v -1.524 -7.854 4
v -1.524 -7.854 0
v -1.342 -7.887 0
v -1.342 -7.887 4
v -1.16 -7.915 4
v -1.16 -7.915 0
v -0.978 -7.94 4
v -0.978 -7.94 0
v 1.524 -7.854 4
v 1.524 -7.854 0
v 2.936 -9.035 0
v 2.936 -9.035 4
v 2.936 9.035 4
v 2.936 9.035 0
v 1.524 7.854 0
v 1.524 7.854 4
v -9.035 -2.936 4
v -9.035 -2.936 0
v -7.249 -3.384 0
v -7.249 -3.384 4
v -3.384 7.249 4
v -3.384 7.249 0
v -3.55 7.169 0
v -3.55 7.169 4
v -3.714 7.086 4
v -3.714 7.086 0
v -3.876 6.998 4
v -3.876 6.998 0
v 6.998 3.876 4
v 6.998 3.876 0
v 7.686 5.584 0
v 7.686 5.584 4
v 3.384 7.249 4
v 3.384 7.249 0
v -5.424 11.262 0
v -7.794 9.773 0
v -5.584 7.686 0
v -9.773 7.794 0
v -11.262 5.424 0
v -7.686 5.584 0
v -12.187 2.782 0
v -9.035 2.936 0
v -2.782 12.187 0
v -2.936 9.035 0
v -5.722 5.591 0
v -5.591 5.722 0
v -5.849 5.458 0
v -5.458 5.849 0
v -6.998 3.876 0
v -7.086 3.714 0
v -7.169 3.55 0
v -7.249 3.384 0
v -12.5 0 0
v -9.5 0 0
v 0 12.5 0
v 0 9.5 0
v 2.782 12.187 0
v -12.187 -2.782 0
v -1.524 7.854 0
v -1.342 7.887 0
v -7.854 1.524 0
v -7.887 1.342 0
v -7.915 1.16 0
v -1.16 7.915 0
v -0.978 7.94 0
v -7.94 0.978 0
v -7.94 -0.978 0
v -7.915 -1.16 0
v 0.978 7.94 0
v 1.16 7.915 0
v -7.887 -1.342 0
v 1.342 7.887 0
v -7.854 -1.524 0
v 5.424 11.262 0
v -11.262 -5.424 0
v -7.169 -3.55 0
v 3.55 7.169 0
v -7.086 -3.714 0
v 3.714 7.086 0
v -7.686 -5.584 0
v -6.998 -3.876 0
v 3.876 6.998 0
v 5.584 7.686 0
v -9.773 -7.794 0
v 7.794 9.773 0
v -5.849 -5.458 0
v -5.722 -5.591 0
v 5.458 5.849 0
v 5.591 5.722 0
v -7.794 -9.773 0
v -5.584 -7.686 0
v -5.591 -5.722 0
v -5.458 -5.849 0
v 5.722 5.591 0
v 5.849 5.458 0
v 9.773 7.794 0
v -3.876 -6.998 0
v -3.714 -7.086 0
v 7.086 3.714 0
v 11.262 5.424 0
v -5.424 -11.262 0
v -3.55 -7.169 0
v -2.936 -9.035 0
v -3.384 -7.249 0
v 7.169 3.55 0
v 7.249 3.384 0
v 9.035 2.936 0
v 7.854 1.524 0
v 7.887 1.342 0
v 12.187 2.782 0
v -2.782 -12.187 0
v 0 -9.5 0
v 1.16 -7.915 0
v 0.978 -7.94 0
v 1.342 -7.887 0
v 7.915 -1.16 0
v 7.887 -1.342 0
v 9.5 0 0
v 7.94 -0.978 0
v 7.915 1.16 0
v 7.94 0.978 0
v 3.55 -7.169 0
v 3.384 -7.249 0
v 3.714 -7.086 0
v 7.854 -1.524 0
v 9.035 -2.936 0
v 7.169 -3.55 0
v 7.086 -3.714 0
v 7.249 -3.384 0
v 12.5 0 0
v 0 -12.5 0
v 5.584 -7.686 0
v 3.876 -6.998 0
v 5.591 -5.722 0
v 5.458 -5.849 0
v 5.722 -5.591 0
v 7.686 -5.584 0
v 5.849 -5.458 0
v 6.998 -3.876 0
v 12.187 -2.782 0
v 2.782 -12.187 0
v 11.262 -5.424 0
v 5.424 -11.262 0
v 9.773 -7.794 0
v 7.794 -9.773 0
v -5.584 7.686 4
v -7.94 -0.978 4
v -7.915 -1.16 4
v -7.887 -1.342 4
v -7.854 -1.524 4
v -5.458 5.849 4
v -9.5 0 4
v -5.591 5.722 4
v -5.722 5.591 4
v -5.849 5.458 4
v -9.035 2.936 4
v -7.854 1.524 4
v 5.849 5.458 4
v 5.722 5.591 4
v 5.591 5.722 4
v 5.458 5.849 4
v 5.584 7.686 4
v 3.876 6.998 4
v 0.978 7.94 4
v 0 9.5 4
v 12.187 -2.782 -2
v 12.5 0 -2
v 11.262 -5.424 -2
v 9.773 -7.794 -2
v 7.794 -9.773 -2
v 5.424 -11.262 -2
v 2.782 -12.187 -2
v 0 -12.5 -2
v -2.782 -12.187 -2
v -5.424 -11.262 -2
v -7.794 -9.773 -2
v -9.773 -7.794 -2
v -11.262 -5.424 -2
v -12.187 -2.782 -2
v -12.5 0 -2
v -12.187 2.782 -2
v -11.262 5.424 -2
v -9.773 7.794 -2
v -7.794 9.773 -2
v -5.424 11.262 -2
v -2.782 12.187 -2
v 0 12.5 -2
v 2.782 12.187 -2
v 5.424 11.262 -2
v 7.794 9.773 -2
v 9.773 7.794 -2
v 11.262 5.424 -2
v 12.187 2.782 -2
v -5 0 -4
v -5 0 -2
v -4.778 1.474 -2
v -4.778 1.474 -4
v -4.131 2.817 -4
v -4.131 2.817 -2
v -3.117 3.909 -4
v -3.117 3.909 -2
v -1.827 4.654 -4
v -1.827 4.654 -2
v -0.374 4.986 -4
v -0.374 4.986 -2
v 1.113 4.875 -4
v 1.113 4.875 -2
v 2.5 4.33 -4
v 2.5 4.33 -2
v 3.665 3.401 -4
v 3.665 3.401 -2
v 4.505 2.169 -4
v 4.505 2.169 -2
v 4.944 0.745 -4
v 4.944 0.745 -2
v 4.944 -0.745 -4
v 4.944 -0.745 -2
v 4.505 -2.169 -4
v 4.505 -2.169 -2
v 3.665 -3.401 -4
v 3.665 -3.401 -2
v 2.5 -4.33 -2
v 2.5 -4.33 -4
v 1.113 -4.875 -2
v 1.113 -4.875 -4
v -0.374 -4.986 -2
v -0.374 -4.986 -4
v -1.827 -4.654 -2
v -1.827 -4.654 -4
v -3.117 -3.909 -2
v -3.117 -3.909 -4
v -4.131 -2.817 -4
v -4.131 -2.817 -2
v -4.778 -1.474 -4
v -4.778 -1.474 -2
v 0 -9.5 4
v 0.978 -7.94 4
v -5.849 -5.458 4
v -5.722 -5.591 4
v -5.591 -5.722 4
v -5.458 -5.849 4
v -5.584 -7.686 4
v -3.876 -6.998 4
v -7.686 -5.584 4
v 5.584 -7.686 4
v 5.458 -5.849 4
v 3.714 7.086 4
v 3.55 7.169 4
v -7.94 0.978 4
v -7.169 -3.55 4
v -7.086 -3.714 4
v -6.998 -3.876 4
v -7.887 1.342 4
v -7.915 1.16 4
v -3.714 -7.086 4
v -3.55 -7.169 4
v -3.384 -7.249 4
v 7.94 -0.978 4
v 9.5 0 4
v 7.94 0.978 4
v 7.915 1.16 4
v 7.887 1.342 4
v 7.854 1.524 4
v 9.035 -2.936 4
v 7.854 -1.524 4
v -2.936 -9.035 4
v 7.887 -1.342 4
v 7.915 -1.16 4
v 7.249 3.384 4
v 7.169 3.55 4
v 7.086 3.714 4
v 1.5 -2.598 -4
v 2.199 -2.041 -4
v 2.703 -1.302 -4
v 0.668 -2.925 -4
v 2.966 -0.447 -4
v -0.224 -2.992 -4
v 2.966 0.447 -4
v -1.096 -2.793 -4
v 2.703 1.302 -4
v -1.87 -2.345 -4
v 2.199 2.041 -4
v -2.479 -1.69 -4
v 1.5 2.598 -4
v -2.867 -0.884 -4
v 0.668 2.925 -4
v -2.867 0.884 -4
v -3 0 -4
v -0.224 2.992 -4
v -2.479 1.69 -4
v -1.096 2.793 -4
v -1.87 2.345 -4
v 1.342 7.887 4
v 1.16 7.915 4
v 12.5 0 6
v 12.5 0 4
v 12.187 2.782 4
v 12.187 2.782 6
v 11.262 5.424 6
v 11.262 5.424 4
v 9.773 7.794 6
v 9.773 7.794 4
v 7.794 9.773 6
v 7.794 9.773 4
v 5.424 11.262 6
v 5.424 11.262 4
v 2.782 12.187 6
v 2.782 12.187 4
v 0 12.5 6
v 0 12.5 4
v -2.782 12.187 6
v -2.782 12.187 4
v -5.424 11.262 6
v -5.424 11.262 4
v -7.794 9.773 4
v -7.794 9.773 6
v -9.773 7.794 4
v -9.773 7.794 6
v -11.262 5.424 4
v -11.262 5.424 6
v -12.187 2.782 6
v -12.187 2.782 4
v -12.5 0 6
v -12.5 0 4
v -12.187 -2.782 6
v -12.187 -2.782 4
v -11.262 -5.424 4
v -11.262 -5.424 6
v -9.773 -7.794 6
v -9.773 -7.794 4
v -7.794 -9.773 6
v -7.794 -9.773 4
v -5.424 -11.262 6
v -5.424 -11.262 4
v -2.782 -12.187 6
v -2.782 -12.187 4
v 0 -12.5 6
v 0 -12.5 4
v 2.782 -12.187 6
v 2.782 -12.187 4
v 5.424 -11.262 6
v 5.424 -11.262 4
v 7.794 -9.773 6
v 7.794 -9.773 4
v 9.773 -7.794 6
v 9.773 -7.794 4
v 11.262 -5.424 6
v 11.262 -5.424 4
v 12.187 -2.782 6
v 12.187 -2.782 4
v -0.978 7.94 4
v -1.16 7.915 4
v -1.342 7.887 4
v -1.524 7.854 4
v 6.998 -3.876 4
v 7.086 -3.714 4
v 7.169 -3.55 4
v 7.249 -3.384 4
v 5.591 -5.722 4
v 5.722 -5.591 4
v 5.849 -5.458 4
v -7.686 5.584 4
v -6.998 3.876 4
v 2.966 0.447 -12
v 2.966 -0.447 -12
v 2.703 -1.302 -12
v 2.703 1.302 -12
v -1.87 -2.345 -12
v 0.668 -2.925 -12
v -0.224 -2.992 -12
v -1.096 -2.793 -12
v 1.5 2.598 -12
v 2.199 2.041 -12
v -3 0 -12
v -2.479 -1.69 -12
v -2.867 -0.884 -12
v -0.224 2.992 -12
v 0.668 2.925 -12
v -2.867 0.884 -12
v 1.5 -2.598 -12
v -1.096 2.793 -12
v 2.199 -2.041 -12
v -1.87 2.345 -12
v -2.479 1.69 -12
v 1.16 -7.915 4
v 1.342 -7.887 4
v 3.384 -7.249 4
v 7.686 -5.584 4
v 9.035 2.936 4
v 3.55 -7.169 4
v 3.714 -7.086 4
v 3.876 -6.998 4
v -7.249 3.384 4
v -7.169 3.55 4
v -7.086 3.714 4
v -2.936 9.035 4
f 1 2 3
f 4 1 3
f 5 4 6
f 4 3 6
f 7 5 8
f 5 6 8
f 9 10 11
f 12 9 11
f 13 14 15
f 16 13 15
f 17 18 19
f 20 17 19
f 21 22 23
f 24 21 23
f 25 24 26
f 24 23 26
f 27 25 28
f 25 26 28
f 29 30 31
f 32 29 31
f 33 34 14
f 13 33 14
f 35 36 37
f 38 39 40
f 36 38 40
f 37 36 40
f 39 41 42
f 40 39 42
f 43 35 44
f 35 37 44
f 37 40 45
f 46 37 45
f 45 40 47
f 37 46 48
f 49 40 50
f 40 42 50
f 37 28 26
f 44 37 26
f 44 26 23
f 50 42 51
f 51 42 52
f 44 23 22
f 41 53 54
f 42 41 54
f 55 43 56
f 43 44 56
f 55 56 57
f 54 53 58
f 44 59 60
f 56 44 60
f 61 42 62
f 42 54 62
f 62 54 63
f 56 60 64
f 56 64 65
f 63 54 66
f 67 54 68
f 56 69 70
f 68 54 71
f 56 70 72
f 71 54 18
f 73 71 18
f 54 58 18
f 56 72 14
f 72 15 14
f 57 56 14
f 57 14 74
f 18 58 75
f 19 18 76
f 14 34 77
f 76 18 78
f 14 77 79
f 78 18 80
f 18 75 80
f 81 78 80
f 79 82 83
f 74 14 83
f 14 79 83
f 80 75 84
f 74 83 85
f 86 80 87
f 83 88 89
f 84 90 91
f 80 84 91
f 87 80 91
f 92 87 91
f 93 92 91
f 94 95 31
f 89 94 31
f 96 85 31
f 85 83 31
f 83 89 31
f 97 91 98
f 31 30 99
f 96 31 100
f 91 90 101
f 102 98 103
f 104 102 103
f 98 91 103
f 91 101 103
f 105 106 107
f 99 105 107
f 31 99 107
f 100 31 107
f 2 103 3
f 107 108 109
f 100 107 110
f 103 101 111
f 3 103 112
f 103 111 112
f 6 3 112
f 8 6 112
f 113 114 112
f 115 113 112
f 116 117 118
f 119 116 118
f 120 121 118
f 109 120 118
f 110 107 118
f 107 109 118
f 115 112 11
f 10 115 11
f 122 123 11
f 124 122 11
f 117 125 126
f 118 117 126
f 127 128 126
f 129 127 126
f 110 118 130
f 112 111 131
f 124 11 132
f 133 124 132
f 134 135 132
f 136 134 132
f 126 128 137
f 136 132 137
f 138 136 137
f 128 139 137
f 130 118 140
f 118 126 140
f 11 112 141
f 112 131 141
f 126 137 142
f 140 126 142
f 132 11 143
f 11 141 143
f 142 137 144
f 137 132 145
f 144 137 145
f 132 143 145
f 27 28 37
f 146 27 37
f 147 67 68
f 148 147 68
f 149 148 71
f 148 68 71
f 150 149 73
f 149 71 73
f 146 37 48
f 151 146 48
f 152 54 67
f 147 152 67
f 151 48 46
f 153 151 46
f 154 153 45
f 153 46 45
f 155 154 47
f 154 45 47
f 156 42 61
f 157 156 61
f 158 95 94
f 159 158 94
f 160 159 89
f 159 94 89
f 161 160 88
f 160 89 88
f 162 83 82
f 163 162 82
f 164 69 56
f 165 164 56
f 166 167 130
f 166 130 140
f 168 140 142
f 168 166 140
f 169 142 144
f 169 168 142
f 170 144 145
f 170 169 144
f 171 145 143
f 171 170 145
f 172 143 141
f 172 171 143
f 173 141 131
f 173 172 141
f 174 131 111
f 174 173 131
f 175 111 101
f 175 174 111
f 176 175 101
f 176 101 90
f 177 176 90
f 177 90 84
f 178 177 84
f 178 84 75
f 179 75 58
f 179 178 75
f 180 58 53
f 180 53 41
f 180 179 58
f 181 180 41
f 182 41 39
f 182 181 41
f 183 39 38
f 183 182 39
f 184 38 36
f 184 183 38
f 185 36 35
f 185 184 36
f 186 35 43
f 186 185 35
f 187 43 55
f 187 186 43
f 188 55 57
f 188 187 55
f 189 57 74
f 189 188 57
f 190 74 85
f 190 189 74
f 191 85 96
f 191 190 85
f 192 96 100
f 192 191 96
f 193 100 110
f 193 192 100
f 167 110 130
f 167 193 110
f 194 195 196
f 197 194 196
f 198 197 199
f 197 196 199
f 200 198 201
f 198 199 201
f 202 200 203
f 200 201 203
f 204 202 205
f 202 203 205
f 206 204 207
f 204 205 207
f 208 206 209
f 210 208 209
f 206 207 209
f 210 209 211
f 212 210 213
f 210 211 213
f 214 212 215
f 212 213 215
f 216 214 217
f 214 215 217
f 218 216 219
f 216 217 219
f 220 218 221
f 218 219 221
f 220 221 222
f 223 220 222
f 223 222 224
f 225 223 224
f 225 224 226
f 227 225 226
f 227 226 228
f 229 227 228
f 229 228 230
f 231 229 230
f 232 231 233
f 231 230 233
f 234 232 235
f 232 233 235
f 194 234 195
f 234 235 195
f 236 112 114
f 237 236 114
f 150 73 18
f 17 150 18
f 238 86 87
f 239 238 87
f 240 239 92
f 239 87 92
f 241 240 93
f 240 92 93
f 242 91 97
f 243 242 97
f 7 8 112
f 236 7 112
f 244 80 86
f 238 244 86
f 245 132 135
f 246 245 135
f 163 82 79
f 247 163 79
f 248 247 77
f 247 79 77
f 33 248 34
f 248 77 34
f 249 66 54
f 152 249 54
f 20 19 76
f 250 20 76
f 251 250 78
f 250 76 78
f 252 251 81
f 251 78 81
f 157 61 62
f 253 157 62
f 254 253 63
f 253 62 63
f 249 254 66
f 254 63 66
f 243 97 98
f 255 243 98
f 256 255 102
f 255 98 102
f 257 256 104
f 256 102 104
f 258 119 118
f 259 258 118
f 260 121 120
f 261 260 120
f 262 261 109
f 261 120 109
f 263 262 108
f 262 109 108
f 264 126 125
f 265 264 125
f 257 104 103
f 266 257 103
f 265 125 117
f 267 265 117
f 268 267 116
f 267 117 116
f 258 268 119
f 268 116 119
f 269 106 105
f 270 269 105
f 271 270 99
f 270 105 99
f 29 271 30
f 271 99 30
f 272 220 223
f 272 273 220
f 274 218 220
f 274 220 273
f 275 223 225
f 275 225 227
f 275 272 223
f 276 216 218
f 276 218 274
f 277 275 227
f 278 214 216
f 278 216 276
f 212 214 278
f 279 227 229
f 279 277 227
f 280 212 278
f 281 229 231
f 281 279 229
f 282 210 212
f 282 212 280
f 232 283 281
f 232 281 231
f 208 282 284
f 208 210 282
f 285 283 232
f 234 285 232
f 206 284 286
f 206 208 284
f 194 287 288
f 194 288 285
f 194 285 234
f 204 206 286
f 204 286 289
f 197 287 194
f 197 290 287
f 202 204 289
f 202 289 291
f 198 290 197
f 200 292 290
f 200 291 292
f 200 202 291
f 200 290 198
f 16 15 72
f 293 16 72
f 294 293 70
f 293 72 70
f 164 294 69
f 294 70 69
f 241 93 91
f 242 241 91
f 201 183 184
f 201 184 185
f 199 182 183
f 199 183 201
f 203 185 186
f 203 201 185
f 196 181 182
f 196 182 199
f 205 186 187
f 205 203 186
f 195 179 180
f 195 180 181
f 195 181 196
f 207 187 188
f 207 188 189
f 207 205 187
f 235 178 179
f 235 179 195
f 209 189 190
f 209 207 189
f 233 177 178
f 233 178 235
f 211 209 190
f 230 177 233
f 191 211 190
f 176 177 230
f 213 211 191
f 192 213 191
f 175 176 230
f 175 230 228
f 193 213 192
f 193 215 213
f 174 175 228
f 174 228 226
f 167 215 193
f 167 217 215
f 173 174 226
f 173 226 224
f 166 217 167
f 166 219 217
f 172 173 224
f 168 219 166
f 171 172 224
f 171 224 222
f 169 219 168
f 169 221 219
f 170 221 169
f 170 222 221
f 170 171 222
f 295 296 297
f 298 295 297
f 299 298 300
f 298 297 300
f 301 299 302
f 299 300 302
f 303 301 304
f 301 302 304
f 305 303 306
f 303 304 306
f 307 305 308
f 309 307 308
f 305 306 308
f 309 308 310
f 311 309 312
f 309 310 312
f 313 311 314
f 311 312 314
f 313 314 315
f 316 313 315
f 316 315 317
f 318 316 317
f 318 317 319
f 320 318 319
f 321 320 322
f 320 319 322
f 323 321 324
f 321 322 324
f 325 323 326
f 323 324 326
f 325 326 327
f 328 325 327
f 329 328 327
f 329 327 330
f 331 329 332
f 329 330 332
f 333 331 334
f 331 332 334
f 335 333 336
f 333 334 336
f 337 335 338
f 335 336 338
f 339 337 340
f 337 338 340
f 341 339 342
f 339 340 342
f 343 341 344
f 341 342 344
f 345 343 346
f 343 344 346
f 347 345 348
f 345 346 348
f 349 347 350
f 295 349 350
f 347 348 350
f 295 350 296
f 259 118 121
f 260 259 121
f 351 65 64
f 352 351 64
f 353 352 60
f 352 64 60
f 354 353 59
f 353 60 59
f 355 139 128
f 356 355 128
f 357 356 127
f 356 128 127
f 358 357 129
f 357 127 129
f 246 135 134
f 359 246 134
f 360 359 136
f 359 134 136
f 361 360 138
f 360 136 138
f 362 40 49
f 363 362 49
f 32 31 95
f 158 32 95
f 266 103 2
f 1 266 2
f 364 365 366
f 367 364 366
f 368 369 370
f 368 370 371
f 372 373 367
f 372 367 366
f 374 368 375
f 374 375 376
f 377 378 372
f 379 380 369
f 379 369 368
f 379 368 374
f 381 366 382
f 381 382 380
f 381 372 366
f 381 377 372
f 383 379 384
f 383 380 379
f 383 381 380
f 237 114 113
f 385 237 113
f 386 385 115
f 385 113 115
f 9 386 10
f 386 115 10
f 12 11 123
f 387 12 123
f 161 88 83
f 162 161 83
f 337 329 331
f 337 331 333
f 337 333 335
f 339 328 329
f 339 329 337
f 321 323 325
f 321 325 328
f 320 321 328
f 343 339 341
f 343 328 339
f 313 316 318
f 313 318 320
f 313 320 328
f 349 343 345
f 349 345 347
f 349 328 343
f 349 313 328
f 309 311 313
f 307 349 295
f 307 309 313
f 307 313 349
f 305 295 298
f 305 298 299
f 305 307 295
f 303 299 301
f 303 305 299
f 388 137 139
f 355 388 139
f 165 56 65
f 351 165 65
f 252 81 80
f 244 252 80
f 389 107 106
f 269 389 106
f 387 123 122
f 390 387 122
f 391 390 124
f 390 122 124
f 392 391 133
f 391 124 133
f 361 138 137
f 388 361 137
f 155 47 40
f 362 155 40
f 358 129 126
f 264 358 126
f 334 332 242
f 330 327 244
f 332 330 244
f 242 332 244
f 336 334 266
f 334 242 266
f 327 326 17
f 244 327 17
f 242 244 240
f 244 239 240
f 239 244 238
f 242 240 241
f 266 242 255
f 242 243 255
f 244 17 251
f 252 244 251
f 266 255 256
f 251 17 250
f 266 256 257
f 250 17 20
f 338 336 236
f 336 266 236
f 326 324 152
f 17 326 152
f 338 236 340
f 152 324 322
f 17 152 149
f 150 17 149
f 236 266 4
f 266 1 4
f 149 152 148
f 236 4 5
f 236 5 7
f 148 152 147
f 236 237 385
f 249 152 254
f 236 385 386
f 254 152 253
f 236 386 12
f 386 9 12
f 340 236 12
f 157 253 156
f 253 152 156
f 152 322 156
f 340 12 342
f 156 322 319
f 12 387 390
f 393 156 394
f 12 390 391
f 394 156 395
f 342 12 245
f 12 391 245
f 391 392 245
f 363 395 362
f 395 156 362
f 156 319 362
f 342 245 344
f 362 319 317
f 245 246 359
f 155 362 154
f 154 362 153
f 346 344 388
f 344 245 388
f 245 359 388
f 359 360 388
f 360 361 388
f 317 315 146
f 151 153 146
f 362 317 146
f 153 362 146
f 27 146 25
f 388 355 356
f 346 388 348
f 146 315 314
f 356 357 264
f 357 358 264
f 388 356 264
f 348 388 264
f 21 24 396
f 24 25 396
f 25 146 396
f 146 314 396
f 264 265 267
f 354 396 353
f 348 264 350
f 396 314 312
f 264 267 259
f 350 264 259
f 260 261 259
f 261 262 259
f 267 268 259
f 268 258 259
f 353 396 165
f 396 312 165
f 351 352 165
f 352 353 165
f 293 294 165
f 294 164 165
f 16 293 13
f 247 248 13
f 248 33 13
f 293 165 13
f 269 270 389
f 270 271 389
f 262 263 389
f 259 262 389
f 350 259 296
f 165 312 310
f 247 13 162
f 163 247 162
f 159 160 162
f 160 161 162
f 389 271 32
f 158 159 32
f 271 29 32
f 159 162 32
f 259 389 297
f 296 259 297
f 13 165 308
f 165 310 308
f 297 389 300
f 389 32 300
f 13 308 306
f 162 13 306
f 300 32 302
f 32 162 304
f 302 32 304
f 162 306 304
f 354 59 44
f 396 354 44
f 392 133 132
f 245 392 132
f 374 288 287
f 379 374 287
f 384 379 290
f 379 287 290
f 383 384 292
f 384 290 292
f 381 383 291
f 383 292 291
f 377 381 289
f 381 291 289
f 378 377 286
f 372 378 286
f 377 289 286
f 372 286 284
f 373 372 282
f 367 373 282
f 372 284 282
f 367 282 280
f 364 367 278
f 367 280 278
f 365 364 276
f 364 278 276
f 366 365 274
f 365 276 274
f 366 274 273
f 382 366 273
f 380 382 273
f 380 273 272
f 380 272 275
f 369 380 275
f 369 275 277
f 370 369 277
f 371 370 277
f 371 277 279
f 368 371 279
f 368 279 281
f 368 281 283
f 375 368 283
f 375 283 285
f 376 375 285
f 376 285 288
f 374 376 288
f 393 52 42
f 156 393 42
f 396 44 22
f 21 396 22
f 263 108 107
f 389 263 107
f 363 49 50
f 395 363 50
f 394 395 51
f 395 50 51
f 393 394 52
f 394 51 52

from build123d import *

# Parameters (mm, degrees)
BOSS_EXTRUDE1_DEPTH = 4
SKETCH3_R           = 12.5
BOSS_EXTRUDE2_DEPTH = 2
BOSS_EXTRUDE3_START = 2
SKETCH4_R           = 12.5
BOSS_EXTRUDE3_DEPTH = 2
SKETCH5_R           = 3
BOSS_EXTRUDE4_DEPTH = 10
SKETCH6_R           = 5
SKETCH6_R_2         = 3
BOSS_EXTRUDE5_DEPTH = 2


with BuildPart() as part:
    # Sketch2 → Boss-Extrude1 (new body)
    with BuildSketch(Plane.XY):
        with BuildLine():
            Line((0, 9.5), (-0.977834373, 7.940015109))
            ThreePointArc((-0.977834373, 7.940015109), (-1.25147572, 7.901506725), (-1.523623852, 7.853570548))
            Line((-1.523623852, 7.853570548), (-2.935661447, 9.035036905))
            Line((-2.935661447, 9.035036905), (-3.383575357, 7.24923567))
            ThreePointArc((-3.383575357, 7.24923567), (-3.631923998, 7.128052194), (-3.875939159, 6.998363783))
            Line((-3.875939159, 6.998363783), (-5.583959897, 7.685661447))
            Line((-5.583959897, 7.685661447), (-5.45810841, 5.848850535))
            ThreePointArc((-5.45810841, 5.848850535), (-5.656854249, 5.656854249), (-5.848850535, 5.45810841))
            Line((-5.848850535, 5.45810841), (-7.685661447, 5.583959897))
            Line((-7.685661447, 5.583959897), (-6.998363783, 3.875939159))
            ThreePointArc((-6.998363783, 3.875939159), (-7.128052194, 3.631923998), (-7.24923567, 3.383575357))
            Line((-7.24923567, 3.383575357), (-9.035036905, 2.935661447))
            Line((-9.035036905, 2.935661447), (-7.853570548, 1.523623852))
            ThreePointArc((-7.853570548, 1.523623852), (-7.901506725, 1.25147572), (-7.940015109, 0.977834373))
            Line((-7.940015109, 0.977834373), (-9.5, 0))
            Line((-9.5, 0), (-7.940015109, -0.977834373))
            ThreePointArc((-7.940015109, -0.977834373), (-7.901506725, -1.25147572), (-7.853570548, -1.523623852))
            Line((-7.853570548, -1.523623852), (-9.035036905, -2.935661447))
            Line((-9.035036905, -2.935661447), (-7.24923567, -3.383575357))
            ThreePointArc((-7.24923567, -3.383575357), (-7.128052194, -3.631923998), (-6.998363783, -3.875939159))
            Line((-6.998363783, -3.875939159), (-7.685661447, -5.583959897))
            Line((-7.685661447, -5.583959897), (-5.848850535, -5.45810841))
            ThreePointArc((-5.848850535, -5.45810841), (-5.656854249, -5.656854249), (-5.45810841, -5.848850535))
            Line((-5.45810841, -5.848850535), (-5.583959897, -7.685661447))
            Line((-5.583959897, -7.685661447), (-3.875939159, -6.998363783))
            ThreePointArc((-3.875939159, -6.998363783), (-3.631923998, -7.128052194), (-3.383575357, -7.24923567))
            Line((-3.383575357, -7.24923567), (-2.935661447, -9.035036905))
            Line((-2.935661447, -9.035036905), (-1.523623852, -7.853570548))
            ThreePointArc((-1.523623852, -7.853570548), (-1.25147572, -7.901506725), (-0.977834373, -7.940015109))
            Line((-0.977834373, -7.940015109), (0, -9.5))
            Line((0, -9.5), (0.977834373, -7.940015109))
            ThreePointArc((0.977834373, -7.940015109), (1.25147572, -7.901506725), (1.523623852, -7.853570548))
            Line((1.523623852, -7.853570548), (2.935661447, -9.035036905))
            Line((2.935661447, -9.035036905), (3.383575357, -7.24923567))
            ThreePointArc((3.383575357, -7.24923567), (3.631923998, -7.128052194), (3.875939159, -6.998363783))
            Line((3.875939159, -6.998363783), (5.583959897, -7.685661447))
            Line((5.583959897, -7.685661447), (5.45810841, -5.848850535))
            ThreePointArc((5.45810841, -5.848850535), (5.656854249, -5.656854249), (5.848850535, -5.45810841))
            Line((5.848850535, -5.45810841), (7.685661447, -5.583959897))
            Line((7.685661447, -5.583959897), (6.998363783, -3.875939159))
            ThreePointArc((6.998363783, -3.875939159), (7.128052194, -3.631923998), (7.24923567, -3.383575357))
            Line((7.24923567, -3.383575357), (9.035036905, -2.935661447))
            Line((9.035036905, -2.935661447), (7.853570548, -1.523623852))
            ThreePointArc((7.853570548, -1.523623852), (7.901506725, -1.25147572), (7.940015109, -0.977834373))
            Line((7.940015109, -0.977834373), (9.5, 0))
            Line((9.5, 0), (7.940015109, 0.977834373))
            ThreePointArc((7.940015109, 0.977834373), (7.901506725, 1.25147572), (7.853570548, 1.523623852))
            Line((7.853570548, 1.523623852), (9.035036905, 2.935661447))
            Line((9.035036905, 2.935661447), (7.24923567, 3.383575357))
            ThreePointArc((7.24923567, 3.383575357), (7.128052194, 3.631923998), (6.998363783, 3.875939159))
            Line((6.998363783, 3.875939159), (7.685661447, 5.583959897))
            Line((7.685661447, 5.583959897), (5.848850535, 5.45810841))
            ThreePointArc((5.848850535, 5.45810841), (5.656854249, 5.656854249), (5.45810841, 5.848850535))
            Line((5.45810841, 5.848850535), (5.583959897, 7.685661447))
            Line((5.583959897, 7.685661447), (3.875939159, 6.998363783))
            ThreePointArc((3.875939159, 6.998363783), (3.631923998, 7.128052194), (3.383575357, 7.24923567))
            Line((3.383575357, 7.24923567), (2.935661447, 9.035036905))
            Line((2.935661447, 9.035036905), (1.523623852, 7.853570548))
            ThreePointArc((1.523623852, 7.853570548), (1.25147572, 7.901506725), (0.977834373, 7.940015109))
            Line((0.977834373, 7.940015109), (0, 9.5))
        make_face()
    extrude(amount=BOSS_EXTRUDE1_DEPTH)

    # Sketch3 → Boss-Extrude2 (add)
    with BuildSketch(Plane.XY.offset(4)):
        Circle(SKETCH3_R)
    extrude(amount=BOSS_EXTRUDE2_DEPTH)

    # Sketch4 → Boss-Extrude3 (add)
    with BuildSketch(Plane(origin=(0, 0, 0), x_dir=(-1, 0, 0), z_dir=(0, 0, -1)).offset(BOSS_EXTRUDE3_START)):
        with Locations(Location((0, 0, 0), (0, 0, 180))):
            Circle(SKETCH4_R)
    extrude(amount=-BOSS_EXTRUDE3_DEPTH)

    # Sketch5 → Boss-Extrude4 (add)
    with BuildSketch(Plane(origin=(0, 0, -2), x_dir=(-1, 0, 0), z_dir=(0, 0, -1))):
        Circle(SKETCH5_R)
    extrude(amount=BOSS_EXTRUDE4_DEPTH)

    # Sketch6 → Boss-Extrude5 (add)
    with BuildSketch(Plane(origin=(0, 0, -2), x_dir=(-1, 0, 0), z_dir=(0, 0, -1))):
        Circle(SKETCH6_R)
        Circle(SKETCH6_R_2, mode=Mode.SUBTRACT)
    extrude(amount=BOSS_EXTRUDE5_DEPTH)


solid = part.part
